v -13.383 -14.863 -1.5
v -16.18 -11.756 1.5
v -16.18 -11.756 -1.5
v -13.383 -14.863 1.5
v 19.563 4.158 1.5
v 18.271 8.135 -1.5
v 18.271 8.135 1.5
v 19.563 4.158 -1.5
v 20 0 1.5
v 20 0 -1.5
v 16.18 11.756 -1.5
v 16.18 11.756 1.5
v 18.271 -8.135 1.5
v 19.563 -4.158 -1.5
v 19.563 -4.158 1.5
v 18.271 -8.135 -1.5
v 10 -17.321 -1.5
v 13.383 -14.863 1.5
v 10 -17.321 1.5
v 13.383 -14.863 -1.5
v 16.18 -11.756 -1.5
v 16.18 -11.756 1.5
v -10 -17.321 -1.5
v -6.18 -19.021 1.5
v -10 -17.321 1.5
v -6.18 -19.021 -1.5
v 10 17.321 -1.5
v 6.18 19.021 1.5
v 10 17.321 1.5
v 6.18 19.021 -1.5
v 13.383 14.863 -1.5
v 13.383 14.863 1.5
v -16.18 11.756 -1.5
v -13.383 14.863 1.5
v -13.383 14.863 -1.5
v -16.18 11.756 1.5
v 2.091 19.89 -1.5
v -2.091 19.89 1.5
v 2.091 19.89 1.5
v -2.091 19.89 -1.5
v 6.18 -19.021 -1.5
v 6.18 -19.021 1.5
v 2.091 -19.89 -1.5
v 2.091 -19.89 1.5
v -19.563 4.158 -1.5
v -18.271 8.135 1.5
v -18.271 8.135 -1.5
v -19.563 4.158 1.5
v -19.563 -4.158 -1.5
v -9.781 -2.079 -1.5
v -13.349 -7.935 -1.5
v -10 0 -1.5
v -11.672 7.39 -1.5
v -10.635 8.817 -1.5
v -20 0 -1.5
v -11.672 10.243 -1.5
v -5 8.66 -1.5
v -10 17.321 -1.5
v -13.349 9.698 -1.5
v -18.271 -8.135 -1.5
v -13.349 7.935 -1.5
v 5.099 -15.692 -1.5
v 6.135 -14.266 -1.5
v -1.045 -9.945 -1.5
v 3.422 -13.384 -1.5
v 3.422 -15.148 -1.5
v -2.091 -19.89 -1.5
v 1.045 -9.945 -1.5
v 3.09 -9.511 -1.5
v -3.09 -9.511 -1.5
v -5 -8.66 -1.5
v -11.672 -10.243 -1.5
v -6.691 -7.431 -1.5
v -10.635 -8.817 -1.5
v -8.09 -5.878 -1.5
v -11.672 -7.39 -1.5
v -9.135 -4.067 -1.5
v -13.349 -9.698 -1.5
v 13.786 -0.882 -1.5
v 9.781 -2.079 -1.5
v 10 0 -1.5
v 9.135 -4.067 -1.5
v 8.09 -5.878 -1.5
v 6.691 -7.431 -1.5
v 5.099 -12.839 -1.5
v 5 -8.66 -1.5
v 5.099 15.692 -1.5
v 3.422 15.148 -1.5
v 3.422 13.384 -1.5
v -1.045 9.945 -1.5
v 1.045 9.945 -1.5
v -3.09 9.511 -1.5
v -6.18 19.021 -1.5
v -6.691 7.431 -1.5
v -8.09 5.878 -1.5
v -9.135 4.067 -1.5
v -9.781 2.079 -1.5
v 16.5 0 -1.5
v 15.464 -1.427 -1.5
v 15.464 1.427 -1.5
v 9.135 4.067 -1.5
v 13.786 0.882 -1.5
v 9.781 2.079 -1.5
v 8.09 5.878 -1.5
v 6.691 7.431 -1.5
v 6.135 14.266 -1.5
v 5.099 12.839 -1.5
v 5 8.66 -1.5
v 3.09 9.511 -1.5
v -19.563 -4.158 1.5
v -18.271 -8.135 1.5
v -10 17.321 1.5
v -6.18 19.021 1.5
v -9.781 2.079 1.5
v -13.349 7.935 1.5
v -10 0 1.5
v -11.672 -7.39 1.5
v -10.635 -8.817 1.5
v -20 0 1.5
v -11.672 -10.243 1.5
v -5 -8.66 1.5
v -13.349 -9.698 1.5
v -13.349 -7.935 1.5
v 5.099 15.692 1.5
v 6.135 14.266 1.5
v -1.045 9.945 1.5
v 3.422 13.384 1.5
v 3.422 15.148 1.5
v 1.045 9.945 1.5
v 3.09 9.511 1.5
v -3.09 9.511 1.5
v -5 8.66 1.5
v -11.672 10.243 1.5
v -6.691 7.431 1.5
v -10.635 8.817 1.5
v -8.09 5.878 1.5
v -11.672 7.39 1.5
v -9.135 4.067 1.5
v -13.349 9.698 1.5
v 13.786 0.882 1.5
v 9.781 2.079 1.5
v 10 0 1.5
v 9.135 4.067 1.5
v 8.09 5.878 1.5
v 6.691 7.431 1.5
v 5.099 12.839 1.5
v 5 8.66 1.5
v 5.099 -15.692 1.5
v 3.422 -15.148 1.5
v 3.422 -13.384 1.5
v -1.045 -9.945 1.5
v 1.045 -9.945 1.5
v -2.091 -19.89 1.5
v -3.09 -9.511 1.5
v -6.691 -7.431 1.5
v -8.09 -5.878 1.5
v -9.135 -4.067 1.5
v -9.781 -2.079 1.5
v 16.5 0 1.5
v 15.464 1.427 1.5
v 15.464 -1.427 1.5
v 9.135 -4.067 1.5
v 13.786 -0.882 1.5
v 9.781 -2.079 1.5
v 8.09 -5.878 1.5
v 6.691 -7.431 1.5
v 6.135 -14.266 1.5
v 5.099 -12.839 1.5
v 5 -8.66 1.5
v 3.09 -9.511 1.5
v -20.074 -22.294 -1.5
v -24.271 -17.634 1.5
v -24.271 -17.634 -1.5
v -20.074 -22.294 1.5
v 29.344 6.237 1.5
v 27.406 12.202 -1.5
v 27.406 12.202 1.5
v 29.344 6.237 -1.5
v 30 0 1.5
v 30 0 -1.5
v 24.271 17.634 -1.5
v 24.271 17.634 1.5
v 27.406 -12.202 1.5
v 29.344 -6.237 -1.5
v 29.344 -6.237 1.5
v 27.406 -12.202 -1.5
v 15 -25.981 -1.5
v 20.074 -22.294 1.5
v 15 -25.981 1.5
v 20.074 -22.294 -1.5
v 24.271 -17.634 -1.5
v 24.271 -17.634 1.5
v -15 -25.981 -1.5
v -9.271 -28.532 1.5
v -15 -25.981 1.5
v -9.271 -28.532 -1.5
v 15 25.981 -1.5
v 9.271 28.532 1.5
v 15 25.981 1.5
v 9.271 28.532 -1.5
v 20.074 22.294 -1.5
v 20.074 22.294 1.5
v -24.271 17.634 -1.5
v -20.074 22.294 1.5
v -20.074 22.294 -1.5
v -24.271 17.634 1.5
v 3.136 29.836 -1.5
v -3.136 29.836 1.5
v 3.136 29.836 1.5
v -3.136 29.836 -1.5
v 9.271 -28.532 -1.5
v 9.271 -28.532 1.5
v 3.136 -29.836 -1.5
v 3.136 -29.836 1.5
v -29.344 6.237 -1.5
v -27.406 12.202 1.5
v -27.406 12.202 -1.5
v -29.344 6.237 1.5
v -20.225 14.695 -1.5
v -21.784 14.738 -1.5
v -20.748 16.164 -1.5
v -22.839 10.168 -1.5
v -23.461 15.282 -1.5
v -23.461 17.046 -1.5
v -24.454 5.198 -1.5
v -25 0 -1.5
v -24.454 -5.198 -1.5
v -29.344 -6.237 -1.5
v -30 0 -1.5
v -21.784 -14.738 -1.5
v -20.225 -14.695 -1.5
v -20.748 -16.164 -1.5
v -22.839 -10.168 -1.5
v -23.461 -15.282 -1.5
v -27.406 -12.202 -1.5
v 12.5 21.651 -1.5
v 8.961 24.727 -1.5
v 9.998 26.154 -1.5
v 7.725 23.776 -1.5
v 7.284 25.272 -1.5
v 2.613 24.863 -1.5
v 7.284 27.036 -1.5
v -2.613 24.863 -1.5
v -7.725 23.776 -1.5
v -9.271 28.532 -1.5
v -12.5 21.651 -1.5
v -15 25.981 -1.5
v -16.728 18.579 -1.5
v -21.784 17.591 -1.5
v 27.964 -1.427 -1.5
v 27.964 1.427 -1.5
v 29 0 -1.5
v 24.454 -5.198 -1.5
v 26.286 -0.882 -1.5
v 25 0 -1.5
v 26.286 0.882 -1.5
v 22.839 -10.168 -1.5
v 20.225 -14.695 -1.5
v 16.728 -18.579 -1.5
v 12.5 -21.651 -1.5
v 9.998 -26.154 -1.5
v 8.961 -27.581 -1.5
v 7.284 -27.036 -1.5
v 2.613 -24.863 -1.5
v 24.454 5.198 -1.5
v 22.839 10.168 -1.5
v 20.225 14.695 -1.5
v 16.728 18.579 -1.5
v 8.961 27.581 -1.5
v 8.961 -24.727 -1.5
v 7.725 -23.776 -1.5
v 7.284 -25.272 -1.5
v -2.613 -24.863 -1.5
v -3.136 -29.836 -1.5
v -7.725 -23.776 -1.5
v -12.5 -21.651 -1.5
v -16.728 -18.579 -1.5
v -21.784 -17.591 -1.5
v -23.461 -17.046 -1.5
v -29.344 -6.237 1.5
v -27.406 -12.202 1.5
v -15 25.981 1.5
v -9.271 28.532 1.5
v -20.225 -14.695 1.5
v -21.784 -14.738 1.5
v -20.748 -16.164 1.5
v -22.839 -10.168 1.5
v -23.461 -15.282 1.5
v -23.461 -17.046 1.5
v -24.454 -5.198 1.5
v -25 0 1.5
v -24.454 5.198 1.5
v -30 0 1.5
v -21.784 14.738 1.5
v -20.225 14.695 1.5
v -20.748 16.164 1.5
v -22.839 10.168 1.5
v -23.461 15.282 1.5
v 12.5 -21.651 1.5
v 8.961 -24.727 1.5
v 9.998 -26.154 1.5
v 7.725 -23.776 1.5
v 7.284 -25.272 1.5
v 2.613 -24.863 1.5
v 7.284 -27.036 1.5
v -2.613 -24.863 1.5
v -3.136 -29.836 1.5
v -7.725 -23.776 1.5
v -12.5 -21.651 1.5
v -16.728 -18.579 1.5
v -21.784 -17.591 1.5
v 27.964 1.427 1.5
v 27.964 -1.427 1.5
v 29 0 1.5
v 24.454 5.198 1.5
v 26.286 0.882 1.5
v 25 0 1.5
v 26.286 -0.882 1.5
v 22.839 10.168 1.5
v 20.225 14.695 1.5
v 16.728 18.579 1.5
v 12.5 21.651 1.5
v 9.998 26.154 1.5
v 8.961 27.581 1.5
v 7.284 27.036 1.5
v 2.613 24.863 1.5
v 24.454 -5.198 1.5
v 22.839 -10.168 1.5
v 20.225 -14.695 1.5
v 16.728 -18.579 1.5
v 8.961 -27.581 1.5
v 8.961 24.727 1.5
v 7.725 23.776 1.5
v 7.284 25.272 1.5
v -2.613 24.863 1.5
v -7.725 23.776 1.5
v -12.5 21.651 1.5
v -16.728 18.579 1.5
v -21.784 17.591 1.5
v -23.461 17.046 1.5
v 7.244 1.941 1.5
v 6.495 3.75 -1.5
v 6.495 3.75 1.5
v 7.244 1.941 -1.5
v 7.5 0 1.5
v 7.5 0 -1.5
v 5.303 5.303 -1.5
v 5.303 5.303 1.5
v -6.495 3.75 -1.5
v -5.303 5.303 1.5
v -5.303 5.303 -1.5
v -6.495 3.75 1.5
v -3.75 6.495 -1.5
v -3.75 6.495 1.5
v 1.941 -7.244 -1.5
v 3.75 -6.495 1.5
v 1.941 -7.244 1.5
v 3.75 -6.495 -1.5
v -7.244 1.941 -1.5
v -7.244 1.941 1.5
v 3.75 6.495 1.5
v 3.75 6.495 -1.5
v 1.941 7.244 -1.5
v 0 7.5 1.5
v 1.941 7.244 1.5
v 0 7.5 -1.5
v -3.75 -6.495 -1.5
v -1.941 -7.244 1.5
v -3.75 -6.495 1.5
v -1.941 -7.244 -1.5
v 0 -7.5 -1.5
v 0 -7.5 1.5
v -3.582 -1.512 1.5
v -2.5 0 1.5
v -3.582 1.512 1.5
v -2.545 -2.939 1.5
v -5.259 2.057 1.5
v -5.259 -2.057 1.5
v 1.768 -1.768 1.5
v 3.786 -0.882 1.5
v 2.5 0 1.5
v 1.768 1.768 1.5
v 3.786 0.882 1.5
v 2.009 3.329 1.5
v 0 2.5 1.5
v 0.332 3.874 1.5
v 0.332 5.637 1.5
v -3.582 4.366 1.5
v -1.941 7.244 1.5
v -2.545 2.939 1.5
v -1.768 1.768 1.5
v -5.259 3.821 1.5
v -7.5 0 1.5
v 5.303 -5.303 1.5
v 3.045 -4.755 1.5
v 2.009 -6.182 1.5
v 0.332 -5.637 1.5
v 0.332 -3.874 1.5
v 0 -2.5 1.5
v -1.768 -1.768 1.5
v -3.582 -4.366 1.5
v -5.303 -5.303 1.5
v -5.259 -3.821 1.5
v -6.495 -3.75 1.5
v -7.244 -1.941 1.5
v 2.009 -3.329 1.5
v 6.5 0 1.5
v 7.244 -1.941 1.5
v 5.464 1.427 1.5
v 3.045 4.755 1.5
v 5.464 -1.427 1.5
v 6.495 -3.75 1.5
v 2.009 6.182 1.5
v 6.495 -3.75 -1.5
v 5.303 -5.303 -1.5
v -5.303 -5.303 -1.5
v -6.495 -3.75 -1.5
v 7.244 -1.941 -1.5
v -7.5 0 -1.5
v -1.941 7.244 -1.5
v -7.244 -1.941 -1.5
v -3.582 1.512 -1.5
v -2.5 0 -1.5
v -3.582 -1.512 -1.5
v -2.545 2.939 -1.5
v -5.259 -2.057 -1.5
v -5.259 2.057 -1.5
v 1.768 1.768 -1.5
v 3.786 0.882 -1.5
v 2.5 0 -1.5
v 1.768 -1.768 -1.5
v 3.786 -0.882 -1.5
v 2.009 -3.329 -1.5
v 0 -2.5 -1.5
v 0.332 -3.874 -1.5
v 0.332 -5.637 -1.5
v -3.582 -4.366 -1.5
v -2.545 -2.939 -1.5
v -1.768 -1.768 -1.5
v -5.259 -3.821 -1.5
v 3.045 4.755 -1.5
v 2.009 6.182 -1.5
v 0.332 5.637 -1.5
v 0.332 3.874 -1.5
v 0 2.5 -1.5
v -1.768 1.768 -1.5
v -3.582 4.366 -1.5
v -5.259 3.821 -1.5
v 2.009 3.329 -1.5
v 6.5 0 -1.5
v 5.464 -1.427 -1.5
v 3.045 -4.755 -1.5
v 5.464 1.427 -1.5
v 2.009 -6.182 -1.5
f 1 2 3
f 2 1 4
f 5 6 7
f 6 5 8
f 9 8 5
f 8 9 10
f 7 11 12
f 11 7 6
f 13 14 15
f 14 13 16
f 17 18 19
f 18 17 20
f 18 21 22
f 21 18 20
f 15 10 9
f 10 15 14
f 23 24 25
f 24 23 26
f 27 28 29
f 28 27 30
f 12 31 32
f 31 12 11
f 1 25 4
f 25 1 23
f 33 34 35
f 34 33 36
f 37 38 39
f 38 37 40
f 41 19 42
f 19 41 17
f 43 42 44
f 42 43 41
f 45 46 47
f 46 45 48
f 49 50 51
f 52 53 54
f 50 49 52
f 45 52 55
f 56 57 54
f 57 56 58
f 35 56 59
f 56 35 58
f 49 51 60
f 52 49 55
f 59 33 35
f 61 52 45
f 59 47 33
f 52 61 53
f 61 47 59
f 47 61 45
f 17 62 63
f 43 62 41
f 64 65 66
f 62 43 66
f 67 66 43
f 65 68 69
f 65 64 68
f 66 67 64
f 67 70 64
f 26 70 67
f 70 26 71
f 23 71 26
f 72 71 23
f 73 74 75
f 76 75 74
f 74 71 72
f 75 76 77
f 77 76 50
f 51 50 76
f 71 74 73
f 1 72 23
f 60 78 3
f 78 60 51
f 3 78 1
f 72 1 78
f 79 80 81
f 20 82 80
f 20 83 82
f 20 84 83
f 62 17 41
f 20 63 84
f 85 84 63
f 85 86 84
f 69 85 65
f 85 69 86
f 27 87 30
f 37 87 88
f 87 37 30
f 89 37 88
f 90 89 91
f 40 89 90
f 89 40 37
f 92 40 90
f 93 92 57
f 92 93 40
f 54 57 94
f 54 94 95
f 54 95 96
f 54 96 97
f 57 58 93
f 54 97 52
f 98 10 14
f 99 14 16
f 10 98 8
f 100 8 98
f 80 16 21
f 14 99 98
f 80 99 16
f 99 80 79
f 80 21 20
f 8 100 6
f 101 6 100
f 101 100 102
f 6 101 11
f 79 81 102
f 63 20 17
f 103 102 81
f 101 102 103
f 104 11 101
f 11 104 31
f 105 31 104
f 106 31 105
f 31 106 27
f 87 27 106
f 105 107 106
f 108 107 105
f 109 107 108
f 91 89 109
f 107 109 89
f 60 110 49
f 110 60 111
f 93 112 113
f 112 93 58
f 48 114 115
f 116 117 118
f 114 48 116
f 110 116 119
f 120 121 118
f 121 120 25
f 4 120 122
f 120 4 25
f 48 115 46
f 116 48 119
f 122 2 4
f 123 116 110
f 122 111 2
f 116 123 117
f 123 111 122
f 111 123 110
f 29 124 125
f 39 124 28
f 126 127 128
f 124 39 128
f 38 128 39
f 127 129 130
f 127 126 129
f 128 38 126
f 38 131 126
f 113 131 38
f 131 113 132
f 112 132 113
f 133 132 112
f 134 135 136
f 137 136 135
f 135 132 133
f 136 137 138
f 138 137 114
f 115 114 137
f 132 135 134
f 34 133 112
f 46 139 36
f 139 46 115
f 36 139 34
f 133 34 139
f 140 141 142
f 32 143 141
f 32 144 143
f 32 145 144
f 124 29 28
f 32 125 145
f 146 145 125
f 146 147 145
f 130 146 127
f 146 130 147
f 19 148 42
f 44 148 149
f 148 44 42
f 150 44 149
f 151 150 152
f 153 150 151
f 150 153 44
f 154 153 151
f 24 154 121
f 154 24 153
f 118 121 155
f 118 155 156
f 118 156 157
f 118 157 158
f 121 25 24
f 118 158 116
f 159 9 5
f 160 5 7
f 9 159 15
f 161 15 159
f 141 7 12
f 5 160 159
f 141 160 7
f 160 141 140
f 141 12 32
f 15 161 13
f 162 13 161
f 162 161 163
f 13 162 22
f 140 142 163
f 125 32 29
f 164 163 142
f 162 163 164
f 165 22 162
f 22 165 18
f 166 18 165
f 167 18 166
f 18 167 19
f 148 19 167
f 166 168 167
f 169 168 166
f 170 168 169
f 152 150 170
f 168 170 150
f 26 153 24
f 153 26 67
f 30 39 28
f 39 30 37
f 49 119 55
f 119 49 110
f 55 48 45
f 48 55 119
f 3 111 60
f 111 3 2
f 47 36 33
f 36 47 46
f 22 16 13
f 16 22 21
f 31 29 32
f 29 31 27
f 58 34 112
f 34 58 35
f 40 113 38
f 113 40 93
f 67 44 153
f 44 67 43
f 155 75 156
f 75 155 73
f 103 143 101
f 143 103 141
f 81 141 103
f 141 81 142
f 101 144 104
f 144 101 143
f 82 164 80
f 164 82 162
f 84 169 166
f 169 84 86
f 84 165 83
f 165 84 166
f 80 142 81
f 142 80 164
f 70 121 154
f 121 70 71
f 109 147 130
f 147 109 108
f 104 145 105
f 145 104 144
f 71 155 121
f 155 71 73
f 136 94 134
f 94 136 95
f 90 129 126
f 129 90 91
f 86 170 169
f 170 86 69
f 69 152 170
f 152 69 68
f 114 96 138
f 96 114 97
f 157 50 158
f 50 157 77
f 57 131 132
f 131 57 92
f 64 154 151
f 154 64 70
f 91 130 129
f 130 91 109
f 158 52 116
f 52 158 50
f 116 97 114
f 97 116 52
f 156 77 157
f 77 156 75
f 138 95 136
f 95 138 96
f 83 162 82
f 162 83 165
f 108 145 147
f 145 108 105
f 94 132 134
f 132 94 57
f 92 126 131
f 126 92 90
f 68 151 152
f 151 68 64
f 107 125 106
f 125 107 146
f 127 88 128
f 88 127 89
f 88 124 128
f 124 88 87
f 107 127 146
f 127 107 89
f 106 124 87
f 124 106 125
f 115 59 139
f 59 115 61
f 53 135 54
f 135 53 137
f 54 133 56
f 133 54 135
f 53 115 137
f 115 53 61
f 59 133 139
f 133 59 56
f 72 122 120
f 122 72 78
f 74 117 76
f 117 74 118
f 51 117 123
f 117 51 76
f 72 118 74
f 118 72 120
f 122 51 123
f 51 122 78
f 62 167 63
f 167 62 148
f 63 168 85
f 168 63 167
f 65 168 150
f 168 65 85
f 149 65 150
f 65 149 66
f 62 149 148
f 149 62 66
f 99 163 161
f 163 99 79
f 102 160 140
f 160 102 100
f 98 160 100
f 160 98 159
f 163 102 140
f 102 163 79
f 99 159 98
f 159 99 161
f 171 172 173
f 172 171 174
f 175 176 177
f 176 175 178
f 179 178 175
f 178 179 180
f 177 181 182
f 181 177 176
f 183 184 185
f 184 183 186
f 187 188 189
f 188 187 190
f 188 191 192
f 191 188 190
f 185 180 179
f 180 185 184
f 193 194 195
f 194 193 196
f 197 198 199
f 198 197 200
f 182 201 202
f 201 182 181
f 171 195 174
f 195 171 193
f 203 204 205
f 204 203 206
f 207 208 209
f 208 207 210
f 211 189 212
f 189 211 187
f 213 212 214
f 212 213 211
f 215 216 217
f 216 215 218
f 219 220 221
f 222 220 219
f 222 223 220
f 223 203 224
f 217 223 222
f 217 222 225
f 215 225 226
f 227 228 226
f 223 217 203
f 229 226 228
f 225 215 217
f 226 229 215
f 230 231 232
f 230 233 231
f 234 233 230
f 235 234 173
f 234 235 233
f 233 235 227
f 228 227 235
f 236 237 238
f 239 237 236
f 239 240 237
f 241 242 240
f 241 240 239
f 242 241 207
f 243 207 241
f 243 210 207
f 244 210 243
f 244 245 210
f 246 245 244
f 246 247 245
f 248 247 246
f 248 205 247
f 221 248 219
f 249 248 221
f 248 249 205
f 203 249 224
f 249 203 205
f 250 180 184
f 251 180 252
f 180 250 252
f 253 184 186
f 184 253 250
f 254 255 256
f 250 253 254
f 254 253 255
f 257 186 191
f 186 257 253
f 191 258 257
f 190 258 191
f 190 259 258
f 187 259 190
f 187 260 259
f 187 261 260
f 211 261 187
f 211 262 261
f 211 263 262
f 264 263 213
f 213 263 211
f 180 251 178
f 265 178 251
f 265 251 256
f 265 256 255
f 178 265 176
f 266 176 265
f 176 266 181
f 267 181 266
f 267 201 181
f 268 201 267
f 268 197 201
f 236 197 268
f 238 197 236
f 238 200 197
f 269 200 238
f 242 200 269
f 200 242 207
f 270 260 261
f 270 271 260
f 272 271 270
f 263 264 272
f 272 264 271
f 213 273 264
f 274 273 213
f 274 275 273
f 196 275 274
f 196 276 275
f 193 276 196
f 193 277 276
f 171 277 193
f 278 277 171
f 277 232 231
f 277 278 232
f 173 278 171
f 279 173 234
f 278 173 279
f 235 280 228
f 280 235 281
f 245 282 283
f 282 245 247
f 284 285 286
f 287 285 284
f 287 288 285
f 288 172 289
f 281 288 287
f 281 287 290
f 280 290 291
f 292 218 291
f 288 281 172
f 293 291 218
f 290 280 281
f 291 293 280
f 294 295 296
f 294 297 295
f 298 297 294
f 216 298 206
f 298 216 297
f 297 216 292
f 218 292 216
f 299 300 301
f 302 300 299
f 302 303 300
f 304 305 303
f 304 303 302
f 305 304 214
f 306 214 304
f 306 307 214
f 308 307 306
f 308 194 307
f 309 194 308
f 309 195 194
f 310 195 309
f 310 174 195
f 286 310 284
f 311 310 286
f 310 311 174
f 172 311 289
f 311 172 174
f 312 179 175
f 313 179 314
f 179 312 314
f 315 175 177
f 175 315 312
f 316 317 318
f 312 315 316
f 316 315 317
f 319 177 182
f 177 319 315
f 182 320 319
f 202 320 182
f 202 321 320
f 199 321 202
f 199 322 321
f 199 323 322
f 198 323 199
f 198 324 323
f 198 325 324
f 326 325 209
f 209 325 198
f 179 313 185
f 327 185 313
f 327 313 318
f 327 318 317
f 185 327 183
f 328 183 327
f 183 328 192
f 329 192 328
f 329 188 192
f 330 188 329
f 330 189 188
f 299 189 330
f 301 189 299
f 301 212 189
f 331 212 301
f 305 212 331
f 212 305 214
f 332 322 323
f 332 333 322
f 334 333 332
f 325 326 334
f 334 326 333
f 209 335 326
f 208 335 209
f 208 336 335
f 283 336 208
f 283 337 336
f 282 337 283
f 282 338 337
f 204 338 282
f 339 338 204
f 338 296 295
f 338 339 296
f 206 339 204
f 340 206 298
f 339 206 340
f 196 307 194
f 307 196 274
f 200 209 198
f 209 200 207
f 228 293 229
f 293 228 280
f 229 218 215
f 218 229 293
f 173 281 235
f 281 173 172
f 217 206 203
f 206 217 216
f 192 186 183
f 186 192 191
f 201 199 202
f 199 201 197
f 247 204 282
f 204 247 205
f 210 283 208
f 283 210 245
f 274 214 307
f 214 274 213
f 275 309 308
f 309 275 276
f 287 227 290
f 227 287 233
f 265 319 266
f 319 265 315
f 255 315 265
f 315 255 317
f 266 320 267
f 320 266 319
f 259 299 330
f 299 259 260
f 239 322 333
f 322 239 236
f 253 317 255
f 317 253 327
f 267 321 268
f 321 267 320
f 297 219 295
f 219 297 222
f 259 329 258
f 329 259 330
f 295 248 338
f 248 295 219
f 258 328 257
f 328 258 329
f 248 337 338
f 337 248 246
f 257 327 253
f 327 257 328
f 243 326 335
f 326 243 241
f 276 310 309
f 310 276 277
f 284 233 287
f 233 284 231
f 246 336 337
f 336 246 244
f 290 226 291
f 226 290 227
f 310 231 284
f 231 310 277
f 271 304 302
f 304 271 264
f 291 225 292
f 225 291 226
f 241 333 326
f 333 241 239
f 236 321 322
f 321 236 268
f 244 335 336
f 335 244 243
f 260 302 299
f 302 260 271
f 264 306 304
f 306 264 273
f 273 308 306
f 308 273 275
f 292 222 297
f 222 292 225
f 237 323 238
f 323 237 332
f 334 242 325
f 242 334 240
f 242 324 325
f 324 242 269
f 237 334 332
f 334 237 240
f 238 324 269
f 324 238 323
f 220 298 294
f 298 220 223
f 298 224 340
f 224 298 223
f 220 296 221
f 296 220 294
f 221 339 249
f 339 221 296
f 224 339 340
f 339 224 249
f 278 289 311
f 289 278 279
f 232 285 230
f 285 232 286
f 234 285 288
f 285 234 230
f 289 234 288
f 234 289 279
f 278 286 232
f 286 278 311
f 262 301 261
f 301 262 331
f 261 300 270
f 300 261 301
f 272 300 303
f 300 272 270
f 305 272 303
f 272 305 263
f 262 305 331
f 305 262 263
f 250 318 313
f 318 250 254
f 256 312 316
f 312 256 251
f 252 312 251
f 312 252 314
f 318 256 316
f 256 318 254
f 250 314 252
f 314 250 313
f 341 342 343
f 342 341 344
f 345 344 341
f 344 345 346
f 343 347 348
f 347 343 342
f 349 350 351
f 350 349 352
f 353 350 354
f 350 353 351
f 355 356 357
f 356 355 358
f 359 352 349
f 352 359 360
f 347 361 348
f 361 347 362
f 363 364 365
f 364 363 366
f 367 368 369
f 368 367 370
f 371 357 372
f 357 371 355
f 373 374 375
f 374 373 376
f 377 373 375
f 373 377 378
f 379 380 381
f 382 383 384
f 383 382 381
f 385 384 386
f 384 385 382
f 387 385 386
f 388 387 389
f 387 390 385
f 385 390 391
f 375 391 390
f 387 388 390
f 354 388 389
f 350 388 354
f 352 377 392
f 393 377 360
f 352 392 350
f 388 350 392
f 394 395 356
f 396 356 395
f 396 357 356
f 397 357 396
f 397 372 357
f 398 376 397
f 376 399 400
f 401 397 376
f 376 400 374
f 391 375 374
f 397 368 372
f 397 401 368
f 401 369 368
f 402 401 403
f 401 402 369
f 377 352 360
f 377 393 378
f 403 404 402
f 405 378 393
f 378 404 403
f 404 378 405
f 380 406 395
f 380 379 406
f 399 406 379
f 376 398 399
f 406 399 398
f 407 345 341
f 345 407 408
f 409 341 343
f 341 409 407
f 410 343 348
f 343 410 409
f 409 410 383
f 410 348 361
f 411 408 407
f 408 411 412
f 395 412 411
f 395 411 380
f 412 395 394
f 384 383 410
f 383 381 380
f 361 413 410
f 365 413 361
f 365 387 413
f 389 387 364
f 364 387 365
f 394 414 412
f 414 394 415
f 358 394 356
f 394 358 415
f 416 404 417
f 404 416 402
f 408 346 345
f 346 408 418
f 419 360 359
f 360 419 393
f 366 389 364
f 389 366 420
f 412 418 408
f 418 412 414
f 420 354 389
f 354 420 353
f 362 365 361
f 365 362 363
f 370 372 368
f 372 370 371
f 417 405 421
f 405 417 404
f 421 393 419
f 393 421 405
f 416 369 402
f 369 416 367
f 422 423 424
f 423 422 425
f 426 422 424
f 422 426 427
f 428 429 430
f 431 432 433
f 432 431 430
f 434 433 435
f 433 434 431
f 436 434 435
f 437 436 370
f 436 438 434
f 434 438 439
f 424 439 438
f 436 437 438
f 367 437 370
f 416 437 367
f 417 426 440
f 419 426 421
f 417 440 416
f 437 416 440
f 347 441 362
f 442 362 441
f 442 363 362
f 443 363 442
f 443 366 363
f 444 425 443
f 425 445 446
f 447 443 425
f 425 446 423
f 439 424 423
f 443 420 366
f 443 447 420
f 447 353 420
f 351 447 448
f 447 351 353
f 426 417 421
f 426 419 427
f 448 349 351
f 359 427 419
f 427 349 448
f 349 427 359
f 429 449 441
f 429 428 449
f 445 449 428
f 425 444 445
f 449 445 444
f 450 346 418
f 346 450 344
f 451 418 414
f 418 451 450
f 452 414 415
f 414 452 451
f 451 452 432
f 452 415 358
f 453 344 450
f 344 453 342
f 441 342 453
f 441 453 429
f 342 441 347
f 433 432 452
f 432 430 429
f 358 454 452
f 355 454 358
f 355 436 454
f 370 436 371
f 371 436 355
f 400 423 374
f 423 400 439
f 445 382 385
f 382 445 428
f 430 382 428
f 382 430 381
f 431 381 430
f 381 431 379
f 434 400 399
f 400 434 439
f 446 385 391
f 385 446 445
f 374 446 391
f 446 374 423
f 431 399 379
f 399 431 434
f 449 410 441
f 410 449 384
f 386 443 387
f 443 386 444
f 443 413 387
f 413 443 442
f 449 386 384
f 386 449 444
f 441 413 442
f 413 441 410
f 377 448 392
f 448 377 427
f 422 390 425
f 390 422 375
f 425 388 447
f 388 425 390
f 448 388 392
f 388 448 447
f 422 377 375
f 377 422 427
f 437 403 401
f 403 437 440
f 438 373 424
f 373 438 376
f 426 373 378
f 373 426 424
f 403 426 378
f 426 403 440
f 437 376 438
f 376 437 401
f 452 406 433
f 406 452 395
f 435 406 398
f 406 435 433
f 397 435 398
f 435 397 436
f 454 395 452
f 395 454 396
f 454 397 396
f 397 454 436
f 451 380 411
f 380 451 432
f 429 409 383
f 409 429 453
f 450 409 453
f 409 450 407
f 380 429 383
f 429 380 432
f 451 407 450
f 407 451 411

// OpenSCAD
 

/*
Simple frame for airplant
*/


/*[global settings]*/
//diameter of holes.
hole_diameter = 3;
//thickness of each layer
thickness = 3;
//number of holes
number_holes = 5;

//bottom dimension (outer)
bottom_ring_outer_diameter = 40;
//bottom dimension (inner)
bottom_ring_inner_diameter = 20;

 

//middle dimension (outer)
middle_ring_outer_diameter = 60;
//middle dimension (inner)
middle_ring_inner_diameter = 50;


//top dimension (outer)
top_ring_outer_diameter = 15;
//top dimension (inner)
top_ring_inner_diameter = 5;

rings();
 
bottom_x = center_x(bottom_ring_inner_diameter,             bottom_ring_outer_diameter); 

middle_x = center_x(middle_ring_inner_diameter,             middle_ring_outer_diameter); 

top_x = center_x(top_ring_inner_diameter,             top_ring_outer_diameter); 

 
 
module holes(x_offset){
    
    translate([x_offset,0,0])
    cylinder(d=hole_diameter, h=thickness+1, center = true);
    
    rotate_degrees = 360.0 / number_holes;
    
    for(i = [1:number_holes-1]){
        r = rotate_degrees * i;
        
        rotate(r)
        translate([x_offset,0,0])
        cylinder(d=hole_diameter, h=thickness+1, center = true);
        
    } 
} 
 


function center_x (inner, outer) =   abs(outer+inner)/4;

module rings(){
// bottom 
    difference(){
        ring(bottom_ring_outer_diameter,     
            bottom_ring_inner_diameter);
         holes(bottom_x, 0);
    }

// middle 
    difference(){
        ring(middle_ring_outer_diameter,     
            middle_ring_inner_diameter);
         holes(middle_x, 0); 
    }
        

// top 
    difference(){
        ring(top_ring_outer_diameter,     
            top_ring_inner_diameter);
         holes(top_x, 0);
    }
} 
 

module ring(outer, inner){
    
    difference(){
        cylinder(d=outer,h=thickness, center = true);
        cylinder(d=inner,h=thickness, center = true);
    }
};


    
    
